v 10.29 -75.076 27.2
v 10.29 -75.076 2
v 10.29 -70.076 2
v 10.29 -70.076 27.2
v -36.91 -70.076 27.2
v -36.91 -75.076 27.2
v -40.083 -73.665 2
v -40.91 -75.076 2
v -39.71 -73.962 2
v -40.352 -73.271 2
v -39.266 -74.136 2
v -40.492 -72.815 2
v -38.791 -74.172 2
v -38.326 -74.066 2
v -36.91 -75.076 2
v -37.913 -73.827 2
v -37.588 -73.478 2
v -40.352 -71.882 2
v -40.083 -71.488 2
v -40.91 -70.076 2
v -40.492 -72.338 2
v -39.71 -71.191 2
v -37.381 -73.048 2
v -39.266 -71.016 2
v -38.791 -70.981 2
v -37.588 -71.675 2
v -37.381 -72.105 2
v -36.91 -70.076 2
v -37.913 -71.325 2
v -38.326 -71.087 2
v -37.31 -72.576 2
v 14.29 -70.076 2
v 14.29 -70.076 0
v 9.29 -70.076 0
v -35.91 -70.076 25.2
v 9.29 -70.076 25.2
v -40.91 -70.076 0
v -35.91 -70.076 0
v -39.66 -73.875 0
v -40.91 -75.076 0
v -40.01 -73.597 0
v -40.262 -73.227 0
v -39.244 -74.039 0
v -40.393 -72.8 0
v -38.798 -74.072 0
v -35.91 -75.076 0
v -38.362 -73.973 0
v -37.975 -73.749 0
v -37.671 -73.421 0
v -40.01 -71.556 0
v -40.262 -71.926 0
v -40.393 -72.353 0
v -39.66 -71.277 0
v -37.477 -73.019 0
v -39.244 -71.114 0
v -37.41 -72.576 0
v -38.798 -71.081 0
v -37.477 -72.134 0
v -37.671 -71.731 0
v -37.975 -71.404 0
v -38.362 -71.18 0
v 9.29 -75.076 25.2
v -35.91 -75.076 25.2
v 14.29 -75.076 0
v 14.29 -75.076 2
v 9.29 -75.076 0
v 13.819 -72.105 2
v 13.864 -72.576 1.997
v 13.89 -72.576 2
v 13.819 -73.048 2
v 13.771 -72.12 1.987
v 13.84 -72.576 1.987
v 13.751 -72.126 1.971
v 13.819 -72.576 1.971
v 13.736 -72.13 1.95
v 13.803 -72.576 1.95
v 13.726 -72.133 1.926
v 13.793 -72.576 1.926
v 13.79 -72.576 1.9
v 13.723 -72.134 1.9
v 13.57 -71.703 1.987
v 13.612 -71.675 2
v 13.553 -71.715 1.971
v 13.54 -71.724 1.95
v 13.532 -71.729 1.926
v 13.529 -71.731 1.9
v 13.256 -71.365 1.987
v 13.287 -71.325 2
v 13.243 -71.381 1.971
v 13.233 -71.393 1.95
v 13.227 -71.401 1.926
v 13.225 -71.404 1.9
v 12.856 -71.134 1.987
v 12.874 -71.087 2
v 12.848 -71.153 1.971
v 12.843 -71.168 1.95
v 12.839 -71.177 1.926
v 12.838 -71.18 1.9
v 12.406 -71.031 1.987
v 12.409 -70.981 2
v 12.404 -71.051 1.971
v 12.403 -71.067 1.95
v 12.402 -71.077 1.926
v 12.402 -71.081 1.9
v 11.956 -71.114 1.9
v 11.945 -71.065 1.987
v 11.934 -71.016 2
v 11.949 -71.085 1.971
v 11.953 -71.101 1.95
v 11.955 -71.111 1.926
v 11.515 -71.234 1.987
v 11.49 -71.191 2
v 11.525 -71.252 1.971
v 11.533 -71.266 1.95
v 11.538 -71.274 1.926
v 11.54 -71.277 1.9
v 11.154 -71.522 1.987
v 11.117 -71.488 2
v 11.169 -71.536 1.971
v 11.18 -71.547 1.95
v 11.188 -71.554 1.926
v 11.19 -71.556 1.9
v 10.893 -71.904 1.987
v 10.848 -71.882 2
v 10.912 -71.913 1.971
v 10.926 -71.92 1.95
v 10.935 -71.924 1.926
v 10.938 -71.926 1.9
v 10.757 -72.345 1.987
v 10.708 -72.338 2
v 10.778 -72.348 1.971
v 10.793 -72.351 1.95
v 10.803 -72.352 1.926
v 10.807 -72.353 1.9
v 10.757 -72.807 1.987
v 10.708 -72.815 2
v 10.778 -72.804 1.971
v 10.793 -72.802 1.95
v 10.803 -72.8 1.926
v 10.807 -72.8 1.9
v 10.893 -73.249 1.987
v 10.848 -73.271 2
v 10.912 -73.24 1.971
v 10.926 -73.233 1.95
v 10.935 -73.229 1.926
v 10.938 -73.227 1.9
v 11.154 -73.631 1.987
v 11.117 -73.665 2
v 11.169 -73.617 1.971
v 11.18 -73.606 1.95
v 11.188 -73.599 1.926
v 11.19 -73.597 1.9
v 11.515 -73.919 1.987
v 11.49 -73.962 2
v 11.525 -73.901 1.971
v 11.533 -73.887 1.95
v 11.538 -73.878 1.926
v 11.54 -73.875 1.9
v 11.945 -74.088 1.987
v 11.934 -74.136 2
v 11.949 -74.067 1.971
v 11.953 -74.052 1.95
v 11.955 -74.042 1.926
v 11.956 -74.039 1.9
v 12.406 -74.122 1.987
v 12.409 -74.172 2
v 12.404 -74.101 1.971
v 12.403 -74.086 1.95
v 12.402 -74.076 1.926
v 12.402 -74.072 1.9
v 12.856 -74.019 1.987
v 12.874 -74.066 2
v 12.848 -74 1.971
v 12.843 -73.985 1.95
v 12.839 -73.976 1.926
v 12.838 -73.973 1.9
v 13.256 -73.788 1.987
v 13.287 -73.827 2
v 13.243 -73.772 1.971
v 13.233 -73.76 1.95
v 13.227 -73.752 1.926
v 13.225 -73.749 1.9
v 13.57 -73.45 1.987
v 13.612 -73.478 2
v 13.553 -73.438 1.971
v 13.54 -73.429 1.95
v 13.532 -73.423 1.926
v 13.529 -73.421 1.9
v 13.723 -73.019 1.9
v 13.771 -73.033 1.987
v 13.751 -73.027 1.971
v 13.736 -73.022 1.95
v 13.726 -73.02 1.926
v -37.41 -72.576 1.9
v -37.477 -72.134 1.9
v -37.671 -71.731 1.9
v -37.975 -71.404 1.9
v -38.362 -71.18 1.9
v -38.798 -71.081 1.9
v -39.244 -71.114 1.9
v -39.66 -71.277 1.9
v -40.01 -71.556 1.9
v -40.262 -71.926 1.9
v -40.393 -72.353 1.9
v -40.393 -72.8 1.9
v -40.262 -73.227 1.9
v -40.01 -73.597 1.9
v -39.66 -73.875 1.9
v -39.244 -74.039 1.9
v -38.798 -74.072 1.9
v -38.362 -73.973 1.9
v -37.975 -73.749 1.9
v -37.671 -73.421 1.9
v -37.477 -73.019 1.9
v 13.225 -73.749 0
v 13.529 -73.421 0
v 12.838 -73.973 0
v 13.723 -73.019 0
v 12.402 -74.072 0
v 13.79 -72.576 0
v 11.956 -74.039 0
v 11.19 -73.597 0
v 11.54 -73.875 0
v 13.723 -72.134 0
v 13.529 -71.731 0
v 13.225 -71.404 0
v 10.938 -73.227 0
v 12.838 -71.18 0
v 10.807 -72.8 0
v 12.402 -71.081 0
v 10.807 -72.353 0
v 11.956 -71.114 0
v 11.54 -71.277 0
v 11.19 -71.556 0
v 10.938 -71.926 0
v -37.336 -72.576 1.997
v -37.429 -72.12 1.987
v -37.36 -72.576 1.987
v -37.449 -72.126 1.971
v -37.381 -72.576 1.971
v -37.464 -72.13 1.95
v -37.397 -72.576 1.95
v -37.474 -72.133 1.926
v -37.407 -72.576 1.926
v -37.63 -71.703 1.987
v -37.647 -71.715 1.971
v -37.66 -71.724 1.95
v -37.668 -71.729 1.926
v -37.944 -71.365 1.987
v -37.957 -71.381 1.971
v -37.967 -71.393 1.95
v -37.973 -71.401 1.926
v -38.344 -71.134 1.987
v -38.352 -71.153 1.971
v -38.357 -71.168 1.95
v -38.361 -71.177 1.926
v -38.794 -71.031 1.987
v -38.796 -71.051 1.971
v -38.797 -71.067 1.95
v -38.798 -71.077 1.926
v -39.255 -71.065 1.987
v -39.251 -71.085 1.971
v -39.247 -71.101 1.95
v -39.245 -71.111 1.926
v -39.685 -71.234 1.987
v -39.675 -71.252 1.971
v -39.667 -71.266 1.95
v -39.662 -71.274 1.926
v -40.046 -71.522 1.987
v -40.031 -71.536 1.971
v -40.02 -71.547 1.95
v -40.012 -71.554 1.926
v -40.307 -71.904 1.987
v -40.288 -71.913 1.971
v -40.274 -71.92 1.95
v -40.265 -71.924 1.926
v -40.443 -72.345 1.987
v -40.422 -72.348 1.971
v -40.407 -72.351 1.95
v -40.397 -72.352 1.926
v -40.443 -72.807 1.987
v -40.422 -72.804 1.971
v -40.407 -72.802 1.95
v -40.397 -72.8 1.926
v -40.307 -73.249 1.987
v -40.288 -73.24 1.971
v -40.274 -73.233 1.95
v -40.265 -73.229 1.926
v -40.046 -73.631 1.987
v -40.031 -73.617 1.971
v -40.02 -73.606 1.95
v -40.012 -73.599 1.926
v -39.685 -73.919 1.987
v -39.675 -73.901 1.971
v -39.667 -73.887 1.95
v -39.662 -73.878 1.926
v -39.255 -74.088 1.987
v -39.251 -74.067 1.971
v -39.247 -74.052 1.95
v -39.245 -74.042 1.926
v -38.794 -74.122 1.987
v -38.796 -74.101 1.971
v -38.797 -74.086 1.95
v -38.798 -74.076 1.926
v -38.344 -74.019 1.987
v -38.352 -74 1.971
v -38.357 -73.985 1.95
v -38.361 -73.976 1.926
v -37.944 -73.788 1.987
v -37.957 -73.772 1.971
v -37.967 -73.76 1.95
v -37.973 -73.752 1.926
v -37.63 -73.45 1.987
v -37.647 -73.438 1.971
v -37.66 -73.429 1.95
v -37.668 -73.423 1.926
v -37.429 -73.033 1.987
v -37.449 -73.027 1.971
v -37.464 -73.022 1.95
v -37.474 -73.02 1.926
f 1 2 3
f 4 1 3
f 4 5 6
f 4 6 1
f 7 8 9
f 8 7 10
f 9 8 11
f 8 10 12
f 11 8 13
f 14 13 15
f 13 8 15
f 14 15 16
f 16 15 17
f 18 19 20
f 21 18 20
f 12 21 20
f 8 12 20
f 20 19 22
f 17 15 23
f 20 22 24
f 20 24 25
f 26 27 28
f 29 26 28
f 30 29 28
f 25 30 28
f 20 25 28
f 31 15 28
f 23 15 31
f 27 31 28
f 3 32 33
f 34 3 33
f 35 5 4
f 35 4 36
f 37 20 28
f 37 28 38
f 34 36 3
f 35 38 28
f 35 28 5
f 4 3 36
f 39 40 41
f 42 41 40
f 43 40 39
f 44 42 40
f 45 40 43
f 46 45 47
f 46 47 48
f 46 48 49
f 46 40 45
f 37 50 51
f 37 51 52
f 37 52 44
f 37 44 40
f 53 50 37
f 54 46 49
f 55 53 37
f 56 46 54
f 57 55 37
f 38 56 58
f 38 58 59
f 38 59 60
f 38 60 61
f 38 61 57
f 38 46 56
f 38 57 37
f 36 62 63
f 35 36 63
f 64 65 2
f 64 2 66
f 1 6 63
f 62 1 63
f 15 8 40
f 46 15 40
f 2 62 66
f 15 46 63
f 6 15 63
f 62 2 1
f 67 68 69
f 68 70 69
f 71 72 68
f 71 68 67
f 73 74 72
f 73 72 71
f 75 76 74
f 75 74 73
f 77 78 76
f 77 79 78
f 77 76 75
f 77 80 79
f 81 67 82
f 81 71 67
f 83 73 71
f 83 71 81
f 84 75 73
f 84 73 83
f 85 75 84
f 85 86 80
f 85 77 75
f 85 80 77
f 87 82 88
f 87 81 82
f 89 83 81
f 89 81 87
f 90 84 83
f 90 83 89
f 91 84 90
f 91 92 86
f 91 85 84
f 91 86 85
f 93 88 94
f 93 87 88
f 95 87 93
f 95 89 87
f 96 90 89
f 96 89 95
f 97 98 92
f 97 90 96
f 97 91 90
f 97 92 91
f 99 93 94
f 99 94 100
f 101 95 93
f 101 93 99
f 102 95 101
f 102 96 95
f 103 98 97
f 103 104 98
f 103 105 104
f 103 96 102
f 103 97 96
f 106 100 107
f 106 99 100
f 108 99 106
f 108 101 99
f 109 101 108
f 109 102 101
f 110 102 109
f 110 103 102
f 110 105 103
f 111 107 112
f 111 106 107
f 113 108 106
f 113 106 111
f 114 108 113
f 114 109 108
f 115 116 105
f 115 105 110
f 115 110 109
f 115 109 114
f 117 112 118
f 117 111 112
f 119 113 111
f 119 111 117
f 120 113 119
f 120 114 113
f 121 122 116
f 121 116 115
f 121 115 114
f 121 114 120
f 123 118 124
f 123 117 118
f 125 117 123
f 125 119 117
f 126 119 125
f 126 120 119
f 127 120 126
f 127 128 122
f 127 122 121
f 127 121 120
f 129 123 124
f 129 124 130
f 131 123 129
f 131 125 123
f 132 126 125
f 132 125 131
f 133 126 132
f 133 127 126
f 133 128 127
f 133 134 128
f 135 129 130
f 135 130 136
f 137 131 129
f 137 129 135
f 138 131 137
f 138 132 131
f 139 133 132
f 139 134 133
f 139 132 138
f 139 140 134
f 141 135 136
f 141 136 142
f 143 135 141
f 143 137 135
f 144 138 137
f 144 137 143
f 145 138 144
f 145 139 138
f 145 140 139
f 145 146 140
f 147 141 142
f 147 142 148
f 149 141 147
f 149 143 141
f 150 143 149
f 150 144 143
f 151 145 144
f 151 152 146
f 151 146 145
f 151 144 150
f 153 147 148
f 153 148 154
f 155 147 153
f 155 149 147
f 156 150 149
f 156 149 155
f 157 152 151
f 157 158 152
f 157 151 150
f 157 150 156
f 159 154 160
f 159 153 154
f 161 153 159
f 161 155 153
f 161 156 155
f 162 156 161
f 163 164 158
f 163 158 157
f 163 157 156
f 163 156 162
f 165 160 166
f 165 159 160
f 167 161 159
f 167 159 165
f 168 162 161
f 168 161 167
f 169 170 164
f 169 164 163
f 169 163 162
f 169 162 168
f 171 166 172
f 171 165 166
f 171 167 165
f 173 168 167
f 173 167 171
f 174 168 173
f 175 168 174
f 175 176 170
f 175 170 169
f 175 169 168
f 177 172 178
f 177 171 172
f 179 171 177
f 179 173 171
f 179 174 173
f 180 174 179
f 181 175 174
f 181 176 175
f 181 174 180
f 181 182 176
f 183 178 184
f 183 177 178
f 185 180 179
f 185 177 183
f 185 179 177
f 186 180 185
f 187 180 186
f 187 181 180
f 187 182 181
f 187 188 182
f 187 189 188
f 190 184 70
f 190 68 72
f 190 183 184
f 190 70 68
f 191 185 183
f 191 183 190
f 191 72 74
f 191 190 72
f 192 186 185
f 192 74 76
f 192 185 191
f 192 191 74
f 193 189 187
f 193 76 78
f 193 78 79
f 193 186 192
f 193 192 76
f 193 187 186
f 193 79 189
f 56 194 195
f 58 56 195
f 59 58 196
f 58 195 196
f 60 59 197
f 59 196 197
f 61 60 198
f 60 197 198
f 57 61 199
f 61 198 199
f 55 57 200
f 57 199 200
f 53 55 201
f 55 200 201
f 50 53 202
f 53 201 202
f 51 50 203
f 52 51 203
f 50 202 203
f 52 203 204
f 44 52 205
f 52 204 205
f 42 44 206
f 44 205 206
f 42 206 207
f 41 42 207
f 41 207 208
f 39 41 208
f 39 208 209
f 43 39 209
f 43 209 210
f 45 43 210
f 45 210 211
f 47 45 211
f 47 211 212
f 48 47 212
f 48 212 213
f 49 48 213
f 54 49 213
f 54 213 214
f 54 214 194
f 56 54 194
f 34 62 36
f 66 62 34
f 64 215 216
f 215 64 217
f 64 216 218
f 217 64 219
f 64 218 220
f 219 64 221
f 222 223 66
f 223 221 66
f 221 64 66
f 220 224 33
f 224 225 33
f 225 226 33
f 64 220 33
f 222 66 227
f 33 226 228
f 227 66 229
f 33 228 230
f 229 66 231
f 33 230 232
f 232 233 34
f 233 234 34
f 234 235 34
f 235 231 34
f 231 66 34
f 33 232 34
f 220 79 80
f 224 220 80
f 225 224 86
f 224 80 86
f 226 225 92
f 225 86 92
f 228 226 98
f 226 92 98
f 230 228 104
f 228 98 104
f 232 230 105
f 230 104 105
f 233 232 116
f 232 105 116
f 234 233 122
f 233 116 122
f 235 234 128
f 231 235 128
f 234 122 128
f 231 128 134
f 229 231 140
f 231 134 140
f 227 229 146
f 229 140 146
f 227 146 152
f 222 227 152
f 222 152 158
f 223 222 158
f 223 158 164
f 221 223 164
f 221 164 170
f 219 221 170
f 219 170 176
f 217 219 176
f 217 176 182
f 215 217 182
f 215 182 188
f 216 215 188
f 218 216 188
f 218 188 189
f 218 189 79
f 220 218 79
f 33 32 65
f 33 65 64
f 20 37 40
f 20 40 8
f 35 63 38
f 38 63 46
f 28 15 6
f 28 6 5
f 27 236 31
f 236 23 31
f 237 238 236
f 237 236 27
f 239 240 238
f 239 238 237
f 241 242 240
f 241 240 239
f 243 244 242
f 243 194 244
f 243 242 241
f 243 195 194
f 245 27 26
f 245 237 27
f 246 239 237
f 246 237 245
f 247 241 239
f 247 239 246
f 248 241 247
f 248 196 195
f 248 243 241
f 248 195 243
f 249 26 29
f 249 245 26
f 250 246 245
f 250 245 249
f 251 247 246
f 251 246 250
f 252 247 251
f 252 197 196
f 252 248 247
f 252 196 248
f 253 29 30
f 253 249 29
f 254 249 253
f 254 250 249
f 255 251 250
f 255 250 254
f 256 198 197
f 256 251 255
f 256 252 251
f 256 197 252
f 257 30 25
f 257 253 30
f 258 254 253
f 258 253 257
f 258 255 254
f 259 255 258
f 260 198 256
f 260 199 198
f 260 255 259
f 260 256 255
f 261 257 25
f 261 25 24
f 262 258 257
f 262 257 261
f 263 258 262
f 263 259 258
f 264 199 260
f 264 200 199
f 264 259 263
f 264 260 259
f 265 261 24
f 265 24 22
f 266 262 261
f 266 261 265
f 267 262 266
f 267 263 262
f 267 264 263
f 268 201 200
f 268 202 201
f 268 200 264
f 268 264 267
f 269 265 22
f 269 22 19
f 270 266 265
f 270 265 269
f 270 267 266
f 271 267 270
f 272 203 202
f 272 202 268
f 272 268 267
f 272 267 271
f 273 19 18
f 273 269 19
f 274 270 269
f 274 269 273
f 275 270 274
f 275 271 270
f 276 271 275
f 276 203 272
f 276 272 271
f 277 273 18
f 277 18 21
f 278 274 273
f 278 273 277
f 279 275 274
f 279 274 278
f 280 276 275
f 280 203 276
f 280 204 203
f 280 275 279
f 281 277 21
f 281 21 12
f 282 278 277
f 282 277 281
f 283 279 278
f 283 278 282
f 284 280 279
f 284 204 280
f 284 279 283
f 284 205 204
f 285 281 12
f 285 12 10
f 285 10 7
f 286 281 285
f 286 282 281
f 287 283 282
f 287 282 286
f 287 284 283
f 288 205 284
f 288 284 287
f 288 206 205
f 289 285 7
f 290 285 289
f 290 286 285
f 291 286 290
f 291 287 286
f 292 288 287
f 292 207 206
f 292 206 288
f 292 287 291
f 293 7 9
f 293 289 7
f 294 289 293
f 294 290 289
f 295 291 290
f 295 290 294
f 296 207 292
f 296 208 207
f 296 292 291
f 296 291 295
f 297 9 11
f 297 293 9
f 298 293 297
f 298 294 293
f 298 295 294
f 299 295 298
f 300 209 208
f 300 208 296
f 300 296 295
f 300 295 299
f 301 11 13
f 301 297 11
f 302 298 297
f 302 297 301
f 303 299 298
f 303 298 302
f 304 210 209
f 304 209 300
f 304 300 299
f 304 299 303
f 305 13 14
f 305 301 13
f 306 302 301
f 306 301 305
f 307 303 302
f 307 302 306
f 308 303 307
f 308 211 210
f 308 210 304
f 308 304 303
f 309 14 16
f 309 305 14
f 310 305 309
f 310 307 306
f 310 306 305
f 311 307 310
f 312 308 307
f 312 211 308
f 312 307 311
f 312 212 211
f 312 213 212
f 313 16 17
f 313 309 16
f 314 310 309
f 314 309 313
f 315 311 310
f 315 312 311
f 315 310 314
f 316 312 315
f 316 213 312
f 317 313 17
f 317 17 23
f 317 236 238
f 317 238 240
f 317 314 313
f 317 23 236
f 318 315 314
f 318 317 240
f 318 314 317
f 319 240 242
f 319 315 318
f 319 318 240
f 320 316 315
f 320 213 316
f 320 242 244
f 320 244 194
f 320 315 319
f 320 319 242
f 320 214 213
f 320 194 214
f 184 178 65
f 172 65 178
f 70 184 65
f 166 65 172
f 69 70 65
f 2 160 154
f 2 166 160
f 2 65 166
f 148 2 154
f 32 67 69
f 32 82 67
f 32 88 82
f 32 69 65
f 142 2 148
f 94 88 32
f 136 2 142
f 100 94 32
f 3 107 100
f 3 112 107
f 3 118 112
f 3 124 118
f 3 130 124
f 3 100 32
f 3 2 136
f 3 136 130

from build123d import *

# Parameters (mm, degrees)
SKETCH10_W          = 50.2
SKETCH10_H          = 5
BOSS_EXTRUDE5_DEPTH = 27.2
SKETCH15_W          = 45.2
SKETCH15_H          = 25.2
CUT_EXTRUDE7_DEPTH  = 48.330596764
SKETCH16_W          = 1.5
SKETCH16_H          = 5
CUT_EXTRUDE8_DEPTH  = 25.2
SKETCH17_W          = 1.5
SKETCH17_H          = 5
CUT_EXTRUDE9_DEPTH  = 25.2
SKETCH19_W          = 2
SKETCH19_H          = 5
BOSS_EXTRUDE6_DEPTH = 2.5
SKETCH20_W          = 2
SKETCH20_H          = 5
BOSS_EXTRUDE7_DEPTH = 2.5
SKETCH21_R          = 1.5
CUT_EXTRUDE10_DEPTH = 2.5
FILLET4_R           = 0.1
SKETCH22_R          = 1.5
CUT_EXTRUDE11_DEPTH = 2.5
FILLET5_R           = 0.1


with BuildPart() as part:
    # Sketch10 → Boss-Extrude5 (new body)
    with BuildSketch(Plane.XY):
        with Locations((-13.310225071, -72.576377738)):
            Rectangle(SKETCH10_W, SKETCH10_H)
    extrude(amount=BOSS_EXTRUDE5_DEPTH)

    # Sketch15 → Cut-Extrude7 (cut, through all)
    with BuildSketch(Plane(origin=(0, -75.076377738, 0), x_dir=(-1, 0, 0), z_dir=(0, -1, 0))):
        with Locations((13.310225071, -12.6)):
            Rectangle(SKETCH15_W, SKETCH15_H)
    extrude(amount=-CUT_EXTRUDE7_DEPTH, mode=Mode.SUBTRACT)

    # Sketch16 → Cut-Extrude8 (cut)
    with BuildSketch(Plane.XY.offset(27.2)):
        with Locations((-37.660225071, -72.576377738)):
            Rectangle(SKETCH16_W, SKETCH16_H)
    extrude(amount=-CUT_EXTRUDE8_DEPTH, mode=Mode.SUBTRACT)

    # Sketch17 → Cut-Extrude9 (cut)
    with BuildSketch(Plane.XY.offset(27.2)):
        with Locations((11.039774929, -72.576377738)):
            Rectangle(SKETCH17_W, SKETCH17_H)
    extrude(amount=-CUT_EXTRUDE9_DEPTH, mode=Mode.SUBTRACT)

    # Sketch19 → Boss-Extrude6 (add)
    with BuildSketch(Plane.ZY.offset(38.410225071)):
        with Locations((1, -72.576377738)):
            Rectangle(SKETCH19_W, SKETCH19_H)
    extrude(amount=BOSS_EXTRUDE6_DEPTH)

    # Sketch20 → Boss-Extrude7 (add)
    with BuildSketch(Plane(origin=(11.789774929, 0, 0), x_dir=(0, 0, -1), z_dir=(1, 0, 0))):
        with Locations((-1, -72.576377738)):
            Rectangle(SKETCH20_W, SKETCH20_H)
    extrude(amount=BOSS_EXTRUDE7_DEPTH)

    # Sketch21 → Cut-Extrude10 (cut)
    with BuildSketch(Plane.XY.offset(2)):
        with Locations((-38.910225071, -72.576377738)):
            Circle(SKETCH21_R)
    extrude(amount=-CUT_EXTRUDE10_DEPTH, mode=Mode.SUBTRACT)

    # Fillet4
    fillet4_edges = [part.edges().sort_by_distance(p)[0] for p in [
        (-40.410225071, -72.576377738, 2),
    ]]
    fillet(fillet4_edges, radius=FILLET4_R)

    # Sketch22 → Cut-Extrude11 (cut)
    with BuildSketch(Plane.XY.offset(2)):
        with Locations((12.289774929, -72.576377738)):
            Circle(SKETCH22_R)
    extrude(amount=-CUT_EXTRUDE11_DEPTH, mode=Mode.SUBTRACT)

    # Fillet5
    fillet5_edges = [part.edges().sort_by_distance(p)[0] for p in [
        (10.789774929, -72.576377738, 2),
    ]]
    fillet(fillet5_edges, radius=FILLET5_R)


solid = part.part
